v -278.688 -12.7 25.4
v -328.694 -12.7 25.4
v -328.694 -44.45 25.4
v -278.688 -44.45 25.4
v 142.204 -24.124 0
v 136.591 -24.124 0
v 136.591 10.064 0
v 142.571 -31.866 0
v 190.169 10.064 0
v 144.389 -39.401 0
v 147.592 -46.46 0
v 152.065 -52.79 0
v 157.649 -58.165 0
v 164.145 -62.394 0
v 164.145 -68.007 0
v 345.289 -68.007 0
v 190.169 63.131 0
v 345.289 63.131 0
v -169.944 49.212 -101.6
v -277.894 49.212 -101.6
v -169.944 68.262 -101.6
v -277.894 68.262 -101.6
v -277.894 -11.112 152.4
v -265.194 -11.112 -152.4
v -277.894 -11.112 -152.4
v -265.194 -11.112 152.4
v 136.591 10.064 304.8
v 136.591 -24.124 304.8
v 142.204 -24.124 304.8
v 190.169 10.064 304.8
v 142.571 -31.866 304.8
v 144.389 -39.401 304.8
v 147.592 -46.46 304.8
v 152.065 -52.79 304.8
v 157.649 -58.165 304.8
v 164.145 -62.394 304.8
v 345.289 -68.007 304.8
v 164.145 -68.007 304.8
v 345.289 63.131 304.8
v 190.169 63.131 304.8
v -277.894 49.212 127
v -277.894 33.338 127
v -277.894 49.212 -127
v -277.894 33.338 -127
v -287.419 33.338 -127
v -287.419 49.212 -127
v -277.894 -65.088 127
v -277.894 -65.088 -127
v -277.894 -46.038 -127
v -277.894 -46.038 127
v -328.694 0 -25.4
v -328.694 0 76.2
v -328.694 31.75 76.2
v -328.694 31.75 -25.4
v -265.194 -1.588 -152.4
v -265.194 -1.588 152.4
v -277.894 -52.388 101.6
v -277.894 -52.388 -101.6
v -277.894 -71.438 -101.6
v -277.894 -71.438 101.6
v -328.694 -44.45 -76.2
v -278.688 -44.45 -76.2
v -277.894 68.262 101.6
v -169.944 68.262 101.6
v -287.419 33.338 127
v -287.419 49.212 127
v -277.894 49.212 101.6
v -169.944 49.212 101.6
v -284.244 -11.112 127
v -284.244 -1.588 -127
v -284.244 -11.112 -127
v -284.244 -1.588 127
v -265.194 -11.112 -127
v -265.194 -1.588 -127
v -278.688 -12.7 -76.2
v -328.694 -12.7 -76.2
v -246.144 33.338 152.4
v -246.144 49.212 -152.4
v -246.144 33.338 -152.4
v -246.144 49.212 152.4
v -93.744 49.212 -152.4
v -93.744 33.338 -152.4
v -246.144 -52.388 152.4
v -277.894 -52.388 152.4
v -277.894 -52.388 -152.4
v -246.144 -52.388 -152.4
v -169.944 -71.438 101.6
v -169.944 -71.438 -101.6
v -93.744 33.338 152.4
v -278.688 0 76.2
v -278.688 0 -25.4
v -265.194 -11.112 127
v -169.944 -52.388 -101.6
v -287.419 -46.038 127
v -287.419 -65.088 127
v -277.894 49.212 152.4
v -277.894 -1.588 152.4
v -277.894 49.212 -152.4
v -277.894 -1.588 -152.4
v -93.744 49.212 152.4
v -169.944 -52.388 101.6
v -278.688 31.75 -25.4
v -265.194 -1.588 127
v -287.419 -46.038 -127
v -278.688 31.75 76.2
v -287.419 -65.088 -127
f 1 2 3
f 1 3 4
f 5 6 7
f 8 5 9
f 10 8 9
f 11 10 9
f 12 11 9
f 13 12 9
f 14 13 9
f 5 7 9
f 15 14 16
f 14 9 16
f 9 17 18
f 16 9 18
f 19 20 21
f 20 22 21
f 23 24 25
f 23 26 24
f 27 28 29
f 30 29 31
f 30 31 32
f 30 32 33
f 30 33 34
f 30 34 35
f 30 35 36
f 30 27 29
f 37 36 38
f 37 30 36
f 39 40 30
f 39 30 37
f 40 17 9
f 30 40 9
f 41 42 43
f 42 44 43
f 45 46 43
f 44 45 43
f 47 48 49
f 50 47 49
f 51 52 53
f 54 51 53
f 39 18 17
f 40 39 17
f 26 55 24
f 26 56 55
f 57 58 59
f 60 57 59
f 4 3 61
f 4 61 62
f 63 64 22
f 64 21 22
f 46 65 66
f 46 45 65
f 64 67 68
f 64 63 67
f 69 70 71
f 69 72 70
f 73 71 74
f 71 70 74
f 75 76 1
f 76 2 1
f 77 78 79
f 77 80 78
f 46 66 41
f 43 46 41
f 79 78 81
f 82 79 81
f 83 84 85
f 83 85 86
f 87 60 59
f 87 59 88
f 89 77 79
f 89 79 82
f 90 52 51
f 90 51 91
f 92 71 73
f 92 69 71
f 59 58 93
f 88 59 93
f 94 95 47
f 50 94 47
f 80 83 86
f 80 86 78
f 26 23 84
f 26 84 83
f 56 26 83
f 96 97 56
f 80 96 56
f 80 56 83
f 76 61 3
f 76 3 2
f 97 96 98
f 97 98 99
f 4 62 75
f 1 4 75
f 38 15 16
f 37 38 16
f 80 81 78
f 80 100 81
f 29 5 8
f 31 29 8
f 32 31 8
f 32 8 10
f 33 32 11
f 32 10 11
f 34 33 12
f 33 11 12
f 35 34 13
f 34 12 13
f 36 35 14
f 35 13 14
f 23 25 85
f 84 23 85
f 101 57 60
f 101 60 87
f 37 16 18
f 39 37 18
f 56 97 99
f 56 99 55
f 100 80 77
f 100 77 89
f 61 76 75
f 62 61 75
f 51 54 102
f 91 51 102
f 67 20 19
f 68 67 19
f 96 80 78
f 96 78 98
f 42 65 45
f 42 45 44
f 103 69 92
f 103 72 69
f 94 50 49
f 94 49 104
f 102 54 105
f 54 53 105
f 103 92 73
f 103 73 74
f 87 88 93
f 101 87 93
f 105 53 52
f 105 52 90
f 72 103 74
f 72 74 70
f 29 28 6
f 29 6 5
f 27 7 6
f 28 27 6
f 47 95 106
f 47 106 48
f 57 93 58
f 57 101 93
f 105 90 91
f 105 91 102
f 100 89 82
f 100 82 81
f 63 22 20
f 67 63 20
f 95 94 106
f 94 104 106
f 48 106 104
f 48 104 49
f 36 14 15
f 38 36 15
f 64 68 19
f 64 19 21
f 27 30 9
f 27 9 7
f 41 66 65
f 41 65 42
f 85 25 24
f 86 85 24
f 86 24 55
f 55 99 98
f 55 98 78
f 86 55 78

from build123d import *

# Parameters (mm, degrees)
F1_DEPTH      = 304.8
F2_W          = 50.00625
F2_H          = 31.75
F3_DEPTH      = 76.2
F3_DEPTH_BACK = 25.4
F2_W_2        = 9.525
F2_H_2        = 15.875
F4_DEPTH      = 127
F5_DEPTH      = 101.6
F6_DEPTH      = 152.4
F7_DEPTH      = 25.4
F7_DEPTH_BACK = 76.2
F8_DEPTH      = 152.4


with BuildPart() as f1:
    # F0 (on Top) → F1 (new body)
    with BuildSketch(Plane.XY):
        with BuildLine():
            Line((345.289171, 63.131358), (190.168634, 63.131358))
            Line((190.168634, 63.131358), (190.168634, 10.063808))
            Line((190.168634, 10.063808), (136.590838, 10.063808))
            Line((136.590838, 10.063808), (136.590838, -24.123937))
            Line((136.590838, -24.123937), (142.203748, -24.123937))
            ThreePointArc((142.203748, -24.123937), (147.591588, -46.459705), (164.145142, -62.393796))
            Line((164.145142, -62.393796), (164.145142, -68.006705))
            Line((164.145142, -68.006705), (345.289171, -68.006705))
            Line((345.289171, -68.006705), (345.289171, 63.131358))
        make_face()
    extrude(amount=F1_DEPTH)


with BuildPart() as f3:
    # F2 (on Top) → F3 (new body, two sides)
    with BuildSketch(Plane.XY) as f3_sk:
        with Locations((-303.690771, 15.875)):
            Rectangle(F2_W, F2_H)
    extrude(amount=F3_DEPTH)
    extrude(f3_sk.sketch, amount=-F3_DEPTH_BACK)


with BuildPart() as f4:
    # F2 (on Top) → F4 (new body, symmetric)
    with BuildSketch(Plane.XY):
        with Locations((-282.656396, 41.275)):
            Rectangle(F2_W_2, F2_H_2)
        Polygon((-277.893896, -52.3875), (-277.893896, -46.0375), (-287.418896, -46.0375), (-287.418896, -65.0875), (-277.893896, -65.0875), align=None)
        Polygon((-284.243896, -11.1125), (-277.893896, -11.1125), (-265.193896, -11.1125), (-265.193896, -1.5875), (-277.893896, -1.5875), (-284.243896, -1.5875), align=None)
    extrude(amount=F4_DEPTH, both=True)


with BuildPart() as f5:
    # F2 (on Top) → F5 (new body, symmetric)
    with BuildSketch(Plane.XY):
        Polygon((-277.893896, 49.2125), (-246.143896, 49.2125), (-169.943896, 49.2125), (-169.943896, 68.2625), (-277.893896, 68.2625), align=None)
        Polygon((-246.143896, -52.3875), (-277.893896, -52.3875), (-277.893896, -65.0875), (-277.893896, -71.4375), (-169.943896, -71.4375), (-169.943896, -52.3875), align=None)
    extrude(amount=F5_DEPTH, both=True)


with BuildPart() as f6:
    # F2 (on Top) → F6 (new body, symmetric)
    with BuildSketch(Plane.XY):
        Polygon((-277.893896, -11.1125), (-277.893896, -12.7), (-277.893896, -44.45), (-277.893896, -46.0375), (-277.893896, -52.3875), (-246.143896, -52.3875), (-246.143896, 33.3375), (-246.143896, 49.2125), (-277.893896, 49.2125), (-277.893896, 33.3375), (-277.893896, 31.75), (-277.893896, 0), (-277.893896, -1.5875), (-265.193896, -1.5875), (-265.193896, -11.1125), align=None)
    extrude(amount=F6_DEPTH, both=True)


with BuildPart() as f7:
    # F2 (on Top) → F7 (new body, two sides)
    with BuildSketch(Plane.XY) as f7_sk:
        with Locations((-303.690771, -28.575)):
            Rectangle(F2_W, F2_H)
    extrude(amount=F7_DEPTH)
    extrude(f7_sk.sketch, amount=-F7_DEPTH_BACK)


with BuildPart() as f8:
    # F2 (on Top) → F8 (new body, symmetric)
    with BuildSketch(Plane.XY):
        Polygon((-246.143896, 49.2125), (-246.143896, 33.3375), (-93.743896, 33.3375), (-93.743896, 49.2125), (-169.943896, 49.2125), align=None)
    extrude(amount=F8_DEPTH, both=True)


solid = Compound([f1.part, f3.part, f4.part, f5.part, f6.part, f7.part, f8.part])
